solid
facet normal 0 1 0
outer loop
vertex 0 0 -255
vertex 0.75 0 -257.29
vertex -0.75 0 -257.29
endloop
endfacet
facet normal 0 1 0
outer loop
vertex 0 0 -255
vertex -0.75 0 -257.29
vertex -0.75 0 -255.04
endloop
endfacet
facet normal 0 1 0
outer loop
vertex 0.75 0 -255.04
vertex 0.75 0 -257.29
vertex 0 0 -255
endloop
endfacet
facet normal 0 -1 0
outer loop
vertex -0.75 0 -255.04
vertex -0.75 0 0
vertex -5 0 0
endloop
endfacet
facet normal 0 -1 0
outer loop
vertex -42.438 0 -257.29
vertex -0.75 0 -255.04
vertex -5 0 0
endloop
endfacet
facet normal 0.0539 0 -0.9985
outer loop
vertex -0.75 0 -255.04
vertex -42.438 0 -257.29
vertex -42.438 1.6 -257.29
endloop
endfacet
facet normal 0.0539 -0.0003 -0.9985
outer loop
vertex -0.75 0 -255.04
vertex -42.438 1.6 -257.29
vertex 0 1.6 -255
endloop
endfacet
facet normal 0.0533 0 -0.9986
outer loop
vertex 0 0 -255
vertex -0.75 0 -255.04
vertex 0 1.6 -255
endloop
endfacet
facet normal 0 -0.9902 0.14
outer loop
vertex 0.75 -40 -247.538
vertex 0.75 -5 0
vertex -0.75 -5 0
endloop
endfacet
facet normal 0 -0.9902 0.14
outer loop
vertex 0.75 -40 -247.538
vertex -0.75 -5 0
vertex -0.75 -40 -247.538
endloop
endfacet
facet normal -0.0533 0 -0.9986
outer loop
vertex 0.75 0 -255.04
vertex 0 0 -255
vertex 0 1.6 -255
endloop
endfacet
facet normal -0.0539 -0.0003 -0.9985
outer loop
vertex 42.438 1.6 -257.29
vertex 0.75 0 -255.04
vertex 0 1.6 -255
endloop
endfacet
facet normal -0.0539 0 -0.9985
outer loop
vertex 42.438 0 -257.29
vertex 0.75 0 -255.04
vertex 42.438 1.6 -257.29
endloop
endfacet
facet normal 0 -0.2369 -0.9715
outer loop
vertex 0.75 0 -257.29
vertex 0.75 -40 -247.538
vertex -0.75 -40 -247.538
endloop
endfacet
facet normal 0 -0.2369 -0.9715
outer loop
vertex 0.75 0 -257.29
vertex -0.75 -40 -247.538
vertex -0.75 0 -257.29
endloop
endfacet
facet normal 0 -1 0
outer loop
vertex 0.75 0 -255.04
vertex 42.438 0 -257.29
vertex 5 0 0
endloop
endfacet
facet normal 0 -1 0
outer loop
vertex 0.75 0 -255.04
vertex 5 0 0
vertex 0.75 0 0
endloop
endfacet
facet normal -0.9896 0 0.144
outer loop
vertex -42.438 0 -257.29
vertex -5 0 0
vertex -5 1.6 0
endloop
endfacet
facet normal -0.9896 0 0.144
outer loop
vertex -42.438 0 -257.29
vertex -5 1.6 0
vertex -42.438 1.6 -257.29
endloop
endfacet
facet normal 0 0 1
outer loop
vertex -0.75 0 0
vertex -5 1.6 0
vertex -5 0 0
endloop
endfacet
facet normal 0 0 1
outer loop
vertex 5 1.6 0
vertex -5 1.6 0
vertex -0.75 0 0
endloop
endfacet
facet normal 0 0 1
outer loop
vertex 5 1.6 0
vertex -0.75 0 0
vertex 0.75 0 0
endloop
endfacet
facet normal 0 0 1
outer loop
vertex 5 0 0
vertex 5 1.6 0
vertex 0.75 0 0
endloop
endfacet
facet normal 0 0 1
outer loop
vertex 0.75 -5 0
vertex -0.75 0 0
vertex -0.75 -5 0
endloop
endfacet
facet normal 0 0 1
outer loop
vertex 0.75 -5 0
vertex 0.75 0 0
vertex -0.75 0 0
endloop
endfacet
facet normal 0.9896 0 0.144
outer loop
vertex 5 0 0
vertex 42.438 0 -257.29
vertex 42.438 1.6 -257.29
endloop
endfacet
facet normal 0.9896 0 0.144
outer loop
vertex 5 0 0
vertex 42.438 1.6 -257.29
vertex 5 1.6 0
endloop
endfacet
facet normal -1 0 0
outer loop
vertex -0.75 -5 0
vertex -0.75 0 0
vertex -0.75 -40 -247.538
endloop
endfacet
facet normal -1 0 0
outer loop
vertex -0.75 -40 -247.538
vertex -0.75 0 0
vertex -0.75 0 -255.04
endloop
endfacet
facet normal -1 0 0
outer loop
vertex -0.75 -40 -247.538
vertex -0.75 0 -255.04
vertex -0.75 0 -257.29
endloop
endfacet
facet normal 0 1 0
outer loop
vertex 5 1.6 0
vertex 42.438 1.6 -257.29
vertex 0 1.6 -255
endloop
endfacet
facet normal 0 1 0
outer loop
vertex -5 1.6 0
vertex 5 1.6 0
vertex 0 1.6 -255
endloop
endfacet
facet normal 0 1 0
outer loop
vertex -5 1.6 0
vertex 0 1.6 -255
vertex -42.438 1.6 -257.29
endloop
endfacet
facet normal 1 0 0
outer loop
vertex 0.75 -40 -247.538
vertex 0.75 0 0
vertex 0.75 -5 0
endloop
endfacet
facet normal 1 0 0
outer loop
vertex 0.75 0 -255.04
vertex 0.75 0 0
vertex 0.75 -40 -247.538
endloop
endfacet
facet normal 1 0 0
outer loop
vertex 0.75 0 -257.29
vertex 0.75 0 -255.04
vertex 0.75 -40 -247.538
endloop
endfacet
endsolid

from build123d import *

# Parameters (mm, degrees)
EXTRUDE_1_DEPTH = 1.6
EXTRUDE_2_DEPTH = 0.75


with BuildPart() as part:
    # ｽｹｯﾁ1 → ﾎﾞｽ - 押し出し1 (new body)
    with BuildSketch(Plane(origin=(0, 0, 0), x_dir=(1, 0, 0), z_dir=(0, 1, 0))):
        Polygon((0, 255), (42.438235274, 257.290455594), (5, 0), (-5, 0), (-42.438235274, 257.290455594), align=None)
    extrude(amount=EXTRUDE_1_DEPTH)

    # ｽｹｯﾁ2 → ﾎﾞｽ - 押し出し2 (add, symmetric)
    with BuildSketch(Plane(origin=(0, 0, 0), x_dir=(0, 0, -1), z_dir=(1, 0, 0))):
        Polygon((0, 0), (0, -5), (247.53787589, -40), (257.290455594, 0), align=None)
    extrude(amount=EXTRUDE_2_DEPTH, both=True)


solid = part.part
